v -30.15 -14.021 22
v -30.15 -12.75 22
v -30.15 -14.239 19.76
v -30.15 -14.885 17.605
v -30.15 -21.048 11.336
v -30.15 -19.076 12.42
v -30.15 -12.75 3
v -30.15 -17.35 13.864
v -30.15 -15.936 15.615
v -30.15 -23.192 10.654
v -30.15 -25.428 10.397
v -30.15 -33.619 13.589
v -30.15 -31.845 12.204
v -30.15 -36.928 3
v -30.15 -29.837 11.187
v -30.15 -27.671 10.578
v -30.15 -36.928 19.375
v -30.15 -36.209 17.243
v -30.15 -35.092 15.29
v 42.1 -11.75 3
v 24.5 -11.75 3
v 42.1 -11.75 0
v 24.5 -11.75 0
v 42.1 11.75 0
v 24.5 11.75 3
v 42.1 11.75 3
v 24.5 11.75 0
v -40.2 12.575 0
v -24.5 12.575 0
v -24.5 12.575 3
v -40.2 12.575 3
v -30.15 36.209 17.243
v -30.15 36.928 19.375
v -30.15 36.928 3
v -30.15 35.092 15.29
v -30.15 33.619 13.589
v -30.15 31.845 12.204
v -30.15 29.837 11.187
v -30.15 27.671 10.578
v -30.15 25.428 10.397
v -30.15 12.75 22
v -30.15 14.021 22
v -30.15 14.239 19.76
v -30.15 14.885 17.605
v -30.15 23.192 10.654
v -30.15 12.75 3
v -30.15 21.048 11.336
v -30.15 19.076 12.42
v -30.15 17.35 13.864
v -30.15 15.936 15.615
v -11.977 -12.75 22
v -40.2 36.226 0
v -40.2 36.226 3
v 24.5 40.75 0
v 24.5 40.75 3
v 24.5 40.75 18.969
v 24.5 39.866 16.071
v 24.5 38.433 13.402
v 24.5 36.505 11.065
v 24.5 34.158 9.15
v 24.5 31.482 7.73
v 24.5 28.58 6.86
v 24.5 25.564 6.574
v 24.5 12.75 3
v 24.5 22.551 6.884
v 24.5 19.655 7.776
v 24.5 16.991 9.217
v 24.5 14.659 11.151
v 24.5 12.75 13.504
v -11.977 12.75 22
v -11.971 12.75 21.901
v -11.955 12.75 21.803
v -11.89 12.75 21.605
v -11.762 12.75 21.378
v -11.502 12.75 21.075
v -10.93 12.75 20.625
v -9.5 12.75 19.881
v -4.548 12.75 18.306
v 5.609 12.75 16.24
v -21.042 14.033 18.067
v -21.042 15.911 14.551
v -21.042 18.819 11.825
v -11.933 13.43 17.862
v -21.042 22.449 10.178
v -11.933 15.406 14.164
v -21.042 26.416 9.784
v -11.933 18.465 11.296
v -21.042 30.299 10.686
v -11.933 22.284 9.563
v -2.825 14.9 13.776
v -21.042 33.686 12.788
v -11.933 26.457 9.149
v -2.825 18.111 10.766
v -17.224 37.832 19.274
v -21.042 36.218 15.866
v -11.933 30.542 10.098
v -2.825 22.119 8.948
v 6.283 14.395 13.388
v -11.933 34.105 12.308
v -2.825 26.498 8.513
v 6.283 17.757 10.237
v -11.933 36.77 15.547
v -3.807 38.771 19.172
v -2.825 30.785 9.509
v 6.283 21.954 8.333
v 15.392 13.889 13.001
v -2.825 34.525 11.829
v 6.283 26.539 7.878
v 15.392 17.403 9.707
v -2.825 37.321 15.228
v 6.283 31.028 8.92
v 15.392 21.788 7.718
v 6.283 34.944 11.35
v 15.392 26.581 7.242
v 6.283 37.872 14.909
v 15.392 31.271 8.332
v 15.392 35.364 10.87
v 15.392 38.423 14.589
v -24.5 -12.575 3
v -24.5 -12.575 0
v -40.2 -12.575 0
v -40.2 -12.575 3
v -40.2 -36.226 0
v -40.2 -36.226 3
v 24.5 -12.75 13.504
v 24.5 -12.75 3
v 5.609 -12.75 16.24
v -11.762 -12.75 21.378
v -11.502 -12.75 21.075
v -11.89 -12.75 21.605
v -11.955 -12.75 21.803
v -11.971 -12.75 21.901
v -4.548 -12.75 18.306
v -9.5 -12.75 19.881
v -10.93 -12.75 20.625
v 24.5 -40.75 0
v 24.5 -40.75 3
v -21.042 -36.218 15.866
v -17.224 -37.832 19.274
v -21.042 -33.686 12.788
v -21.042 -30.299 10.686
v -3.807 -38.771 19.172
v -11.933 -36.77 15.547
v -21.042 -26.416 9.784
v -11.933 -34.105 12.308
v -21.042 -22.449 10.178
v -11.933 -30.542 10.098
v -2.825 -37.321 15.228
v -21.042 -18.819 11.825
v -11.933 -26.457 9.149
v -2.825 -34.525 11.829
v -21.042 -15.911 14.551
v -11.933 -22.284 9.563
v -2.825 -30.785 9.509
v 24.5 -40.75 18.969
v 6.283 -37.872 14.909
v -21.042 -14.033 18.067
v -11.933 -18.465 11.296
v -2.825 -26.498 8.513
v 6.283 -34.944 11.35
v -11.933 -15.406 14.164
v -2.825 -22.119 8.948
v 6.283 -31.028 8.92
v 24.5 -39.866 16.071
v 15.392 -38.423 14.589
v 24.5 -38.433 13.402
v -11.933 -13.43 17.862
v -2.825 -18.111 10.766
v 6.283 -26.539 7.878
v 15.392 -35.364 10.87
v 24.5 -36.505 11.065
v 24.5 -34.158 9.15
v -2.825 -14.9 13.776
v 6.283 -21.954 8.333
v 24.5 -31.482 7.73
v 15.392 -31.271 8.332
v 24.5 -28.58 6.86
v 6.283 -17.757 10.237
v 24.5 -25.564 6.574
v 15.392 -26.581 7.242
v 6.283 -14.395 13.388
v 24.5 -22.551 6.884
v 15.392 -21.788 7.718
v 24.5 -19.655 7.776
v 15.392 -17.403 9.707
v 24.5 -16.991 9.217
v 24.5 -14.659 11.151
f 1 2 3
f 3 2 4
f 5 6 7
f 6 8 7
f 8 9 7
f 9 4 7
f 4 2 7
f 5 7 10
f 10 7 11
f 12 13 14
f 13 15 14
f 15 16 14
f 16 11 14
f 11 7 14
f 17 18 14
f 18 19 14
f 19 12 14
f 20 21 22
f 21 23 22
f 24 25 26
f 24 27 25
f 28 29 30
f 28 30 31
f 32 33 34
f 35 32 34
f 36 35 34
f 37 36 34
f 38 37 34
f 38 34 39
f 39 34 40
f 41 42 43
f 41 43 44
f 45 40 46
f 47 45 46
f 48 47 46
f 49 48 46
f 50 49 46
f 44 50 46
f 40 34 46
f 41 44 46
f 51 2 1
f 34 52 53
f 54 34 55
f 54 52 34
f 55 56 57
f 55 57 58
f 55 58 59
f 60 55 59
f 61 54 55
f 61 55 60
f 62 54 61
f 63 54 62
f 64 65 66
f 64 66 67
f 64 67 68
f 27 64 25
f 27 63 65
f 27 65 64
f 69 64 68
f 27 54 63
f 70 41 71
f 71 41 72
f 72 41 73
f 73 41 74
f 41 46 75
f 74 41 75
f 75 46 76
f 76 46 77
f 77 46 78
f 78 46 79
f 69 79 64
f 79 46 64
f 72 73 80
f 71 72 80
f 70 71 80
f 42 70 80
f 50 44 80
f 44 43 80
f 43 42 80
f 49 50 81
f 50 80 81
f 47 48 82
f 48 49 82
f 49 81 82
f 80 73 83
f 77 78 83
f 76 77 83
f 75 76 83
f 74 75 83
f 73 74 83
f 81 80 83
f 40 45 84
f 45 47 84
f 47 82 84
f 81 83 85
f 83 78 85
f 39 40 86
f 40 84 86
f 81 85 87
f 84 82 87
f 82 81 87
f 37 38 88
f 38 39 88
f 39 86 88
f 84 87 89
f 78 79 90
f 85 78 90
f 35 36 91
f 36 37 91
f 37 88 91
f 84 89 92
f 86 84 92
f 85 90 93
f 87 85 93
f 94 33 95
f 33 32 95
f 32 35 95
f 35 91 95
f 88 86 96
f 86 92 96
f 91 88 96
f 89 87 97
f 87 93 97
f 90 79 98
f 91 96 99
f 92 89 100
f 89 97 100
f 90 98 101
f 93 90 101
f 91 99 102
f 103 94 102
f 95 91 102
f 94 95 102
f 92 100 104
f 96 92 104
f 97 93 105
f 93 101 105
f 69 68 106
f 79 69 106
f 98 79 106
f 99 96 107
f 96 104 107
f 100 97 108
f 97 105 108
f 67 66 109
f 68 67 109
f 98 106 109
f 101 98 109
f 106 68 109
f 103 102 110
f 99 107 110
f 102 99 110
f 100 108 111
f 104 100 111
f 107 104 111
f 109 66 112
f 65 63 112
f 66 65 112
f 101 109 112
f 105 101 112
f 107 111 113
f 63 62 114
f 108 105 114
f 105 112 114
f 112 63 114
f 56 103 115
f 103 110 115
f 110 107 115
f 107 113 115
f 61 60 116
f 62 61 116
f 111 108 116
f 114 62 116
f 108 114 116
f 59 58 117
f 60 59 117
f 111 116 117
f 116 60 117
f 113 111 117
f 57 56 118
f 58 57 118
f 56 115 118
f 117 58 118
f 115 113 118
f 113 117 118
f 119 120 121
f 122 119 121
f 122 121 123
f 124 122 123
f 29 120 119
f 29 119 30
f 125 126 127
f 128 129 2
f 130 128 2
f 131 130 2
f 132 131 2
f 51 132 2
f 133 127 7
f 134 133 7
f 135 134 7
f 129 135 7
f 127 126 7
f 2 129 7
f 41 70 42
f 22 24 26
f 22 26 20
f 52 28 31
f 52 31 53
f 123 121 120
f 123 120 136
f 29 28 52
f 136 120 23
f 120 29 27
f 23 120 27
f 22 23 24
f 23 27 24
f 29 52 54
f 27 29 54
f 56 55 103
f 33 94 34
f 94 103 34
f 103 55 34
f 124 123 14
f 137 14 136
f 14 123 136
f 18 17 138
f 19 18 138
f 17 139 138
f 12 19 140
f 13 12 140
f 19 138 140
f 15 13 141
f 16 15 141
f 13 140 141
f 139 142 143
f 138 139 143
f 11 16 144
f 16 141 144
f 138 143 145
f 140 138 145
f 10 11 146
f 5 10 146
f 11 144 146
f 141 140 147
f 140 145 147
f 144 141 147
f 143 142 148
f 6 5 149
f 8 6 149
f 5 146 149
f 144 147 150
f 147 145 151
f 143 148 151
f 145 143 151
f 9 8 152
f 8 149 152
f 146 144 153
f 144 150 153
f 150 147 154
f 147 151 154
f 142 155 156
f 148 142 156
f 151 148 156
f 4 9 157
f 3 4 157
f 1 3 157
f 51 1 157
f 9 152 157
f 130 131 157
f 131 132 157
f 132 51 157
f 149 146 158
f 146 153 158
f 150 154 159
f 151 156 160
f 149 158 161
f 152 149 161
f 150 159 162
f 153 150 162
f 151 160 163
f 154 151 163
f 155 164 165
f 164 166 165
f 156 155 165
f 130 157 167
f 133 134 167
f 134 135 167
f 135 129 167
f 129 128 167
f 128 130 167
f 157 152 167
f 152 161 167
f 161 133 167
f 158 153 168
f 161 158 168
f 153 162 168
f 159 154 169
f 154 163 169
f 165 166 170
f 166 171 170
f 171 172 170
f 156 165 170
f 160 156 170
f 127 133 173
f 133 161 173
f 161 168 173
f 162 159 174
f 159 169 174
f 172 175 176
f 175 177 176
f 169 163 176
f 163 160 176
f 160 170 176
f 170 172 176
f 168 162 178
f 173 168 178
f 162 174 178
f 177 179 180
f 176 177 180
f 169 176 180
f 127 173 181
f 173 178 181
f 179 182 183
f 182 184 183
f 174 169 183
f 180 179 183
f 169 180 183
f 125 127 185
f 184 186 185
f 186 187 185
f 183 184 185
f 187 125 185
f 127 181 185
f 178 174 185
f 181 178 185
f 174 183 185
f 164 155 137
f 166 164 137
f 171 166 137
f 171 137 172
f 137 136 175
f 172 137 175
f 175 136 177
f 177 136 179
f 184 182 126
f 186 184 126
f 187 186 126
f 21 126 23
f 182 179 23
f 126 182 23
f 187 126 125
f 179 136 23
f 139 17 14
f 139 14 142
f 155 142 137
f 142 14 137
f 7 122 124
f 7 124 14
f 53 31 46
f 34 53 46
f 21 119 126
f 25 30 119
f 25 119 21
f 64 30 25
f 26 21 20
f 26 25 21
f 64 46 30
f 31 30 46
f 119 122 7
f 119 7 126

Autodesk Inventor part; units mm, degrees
ref_plane "YZ Plane" through (0, 0, 0) normal (1, 0, 0) x (0, 1, 0)
ref_plane "XZ Plane" through (0, 0, 0) normal (0, 1, 0) x (-1, 0, 0)
ref_plane "XY Plane" through (0, 0, 0) normal (0, 0, 1) x (1, 0, 0)
sketch "Sketch2" plane through (0, 0, 0) normal (0, 0, 1) x (1, 0, 0)
  line L0 (0, -57.05) -> (0, 57.05) construction
  line L1 (-56.66, 0) -> (58.56, 0) construction
  line L2 (-24.5, 0) -> (-24.5, -12.575)
  line L3 (-24.5, -12.575) -> (-40.2, -12.575)
  line L4 (-40.2, -12.575) -> (-40.2, -36.2257)
  line L5 (-40.2, -36.2257) -> (24.5, -40.75)
  line L6 (24.5, -40.75) -> (24.5, -11.75)
  line L7 (24.5, -11.75) -> (42.1, -11.75)
  line L8 (42.1, -11.75) -> (42.1, 0)
  line L9 (-24.5, 0) -> (-24.5, 12.575)
  line L10 (-24.5, 12.575) -> (-40.2, 12.575)
  line L11 (-40.2, 12.575) -> (-40.2, 36.2257)
  line L12 (-40.2, 36.2257) -> (24.5, 40.75)
  line L13 (24.5, 40.75) -> (24.5, 11.75)
  line L14 (24.5, 11.75) -> (42.1, 11.75)
  line L15 (42.1, 11.75) -> (42.1, 0)
  line L16 (-35, 12.575) -> (-35, -12.575) construction
  line L17 (35, 11.75) -> (35, -11.75) construction
  point P0 (0, 0)
  dimension "d0" = 25.15
  dimension "d1" = 70
  dimension "d2" = 10.5
  dimension "d3" = 10.5
  dimension "d4" = 5.2
  dimension "d5" = 7.1
  dimension "d6" = 23.5
  dimension "d7" = 81.5
  dimension "d8" = 8
extrude "Extrusion1" add sketch "Sketch2" along normal blind 3
fillet "Fillet1" [suppressed]
sketch "Sketch3" plane through (0, 0, 3) normal (0, 0, 1) x (1, 0, 0)
  line L0 (-30.15, -25.625) -> (24.5, -25.625) construction
  line L1 (24.5, -40.75) -> (24.5, -11.75) construction
  line L2 (-40.2, -36.2257) -> (24.5, -40.75) construction
  line L3 (-40.2, -12.575) -> (-40.2, -36.2257) construction
  line L4 (-24.5, -12.575) -> (-40.2, -12.575) construction
  line L5 (24.5, -12.75) -> (-30.15, -12.75)
  line L6 (-30.15, -12.75) -> (-30.15, -36.9285)
  line L7 (-30.15, -36.9285) -> (24.5, -40.75)
  line L8 (24.5, -12.75) -> (24.5, -40.75)
  point P0 (0, 0)
  dimension "d12" = 25.625
  dimension "d13" = 28
  dimension "d14" = 54.65
extrude "Extrusion2" add sketch "Sketch3" along normal blind 19
sketch "Sketch4" plane through (0, 0, 22) normal (0, 0, 1) x (1, 0, 0)
  line L0 (-30.15, -25.625) -> (24.5, -25.625) construction
  line L1 (-30.15, -36.9285) -> (24.5, -40.75) construction
  line L2 (-30.15, -12.75) -> (-30.15, -36.9285) projected
  line L3 (24.5, -40.75) -> (24.5, -12.75) projected
  line L4 (-30.15, -25.625) -> (24.5, -25.625)
  line L5 (-30.15, -36.9285) -> (-30.15, -37.2292)
  line L6 (-30.15, -37.2292) -> (24.5, -41.0507)
  line L7 (24.5, -41.0507) -> (24.5, -40.75)
  point P0 (0, 0)
  dimension "d18" = 0.3
revolve "Revolution1" cut sketch "Sketch4" angle 360 about axis through (-30.15, -25.625, 22) along (1, 0, 0)
mirror "Mirror1" about plane through (0, 0, 0) normal (0, 1, 0) of "Extrusion2", "Revolution1"
equation "\"d0\" = finger_width + 2 * finger_link_clearence"
equation "\"d12\" = 0.5 * dist_hinge_points"
equation "\"finger_width\" = 25"
equation "\"finger_thickness\" = 8"
equation "\"finger_part_A_length\" = 42.8625"
equation "\"finger_part_B_length\" = 28.575"
equation "\"finger_link_width\" = 3.5"
equation "\"finger_link_clearence\" = 0.075"
equation "\"tol\" = 0.5 * finger_link_clearence"
equation "\"link_tol\" = 0.254"
equation "\"bore_press\" = 2.925"
equation "\"bore_clearance\" = 3.025"
equation "\"bar_diameter\" = 6.5"
equation "\"bar_thickness\" = 4"
equation "\"bar_width\" = 7"
equation "\"hinge_dist_sym_plane\" = 4"
equation "\"hinge_thickness\" = 3"
equation "\"hinge_act_length_c\" = 7.62"
equation "\"hinge_act_length_bc\" = 16.66875"
equation "\"hinge_act_length_ab\" = 11.049"
equation "\"hinge_act_length_a\" = 21.43125"
equation "\"hinge_guid_length_c\" = 9.525"
equation "\"hinge_guid_length_bc\" = 9.525"
equation "\"hinge_guid_length_ab\" = 17.145"
equation "\"hinge_guid_length_a\" = 17.145"
equation "\"bar_length_bc\" = finger_part_B_length"
equation "\"bar_act_length_ab\" = 40.48125"
equation "\"bar_guid_length_ab\" = 43.275"
equation "\"champfer\" = 0.3"
equation "\"fillet\" = 0.4"
equation "\"gear_diameter\" = 14"
equation "\"dist_finger_BC\" = 56.5"
equation "\"hinge_point\" = 15"
equation "\"dist_hinge_points\" = 51.25"
properties part number "hand-palm"
